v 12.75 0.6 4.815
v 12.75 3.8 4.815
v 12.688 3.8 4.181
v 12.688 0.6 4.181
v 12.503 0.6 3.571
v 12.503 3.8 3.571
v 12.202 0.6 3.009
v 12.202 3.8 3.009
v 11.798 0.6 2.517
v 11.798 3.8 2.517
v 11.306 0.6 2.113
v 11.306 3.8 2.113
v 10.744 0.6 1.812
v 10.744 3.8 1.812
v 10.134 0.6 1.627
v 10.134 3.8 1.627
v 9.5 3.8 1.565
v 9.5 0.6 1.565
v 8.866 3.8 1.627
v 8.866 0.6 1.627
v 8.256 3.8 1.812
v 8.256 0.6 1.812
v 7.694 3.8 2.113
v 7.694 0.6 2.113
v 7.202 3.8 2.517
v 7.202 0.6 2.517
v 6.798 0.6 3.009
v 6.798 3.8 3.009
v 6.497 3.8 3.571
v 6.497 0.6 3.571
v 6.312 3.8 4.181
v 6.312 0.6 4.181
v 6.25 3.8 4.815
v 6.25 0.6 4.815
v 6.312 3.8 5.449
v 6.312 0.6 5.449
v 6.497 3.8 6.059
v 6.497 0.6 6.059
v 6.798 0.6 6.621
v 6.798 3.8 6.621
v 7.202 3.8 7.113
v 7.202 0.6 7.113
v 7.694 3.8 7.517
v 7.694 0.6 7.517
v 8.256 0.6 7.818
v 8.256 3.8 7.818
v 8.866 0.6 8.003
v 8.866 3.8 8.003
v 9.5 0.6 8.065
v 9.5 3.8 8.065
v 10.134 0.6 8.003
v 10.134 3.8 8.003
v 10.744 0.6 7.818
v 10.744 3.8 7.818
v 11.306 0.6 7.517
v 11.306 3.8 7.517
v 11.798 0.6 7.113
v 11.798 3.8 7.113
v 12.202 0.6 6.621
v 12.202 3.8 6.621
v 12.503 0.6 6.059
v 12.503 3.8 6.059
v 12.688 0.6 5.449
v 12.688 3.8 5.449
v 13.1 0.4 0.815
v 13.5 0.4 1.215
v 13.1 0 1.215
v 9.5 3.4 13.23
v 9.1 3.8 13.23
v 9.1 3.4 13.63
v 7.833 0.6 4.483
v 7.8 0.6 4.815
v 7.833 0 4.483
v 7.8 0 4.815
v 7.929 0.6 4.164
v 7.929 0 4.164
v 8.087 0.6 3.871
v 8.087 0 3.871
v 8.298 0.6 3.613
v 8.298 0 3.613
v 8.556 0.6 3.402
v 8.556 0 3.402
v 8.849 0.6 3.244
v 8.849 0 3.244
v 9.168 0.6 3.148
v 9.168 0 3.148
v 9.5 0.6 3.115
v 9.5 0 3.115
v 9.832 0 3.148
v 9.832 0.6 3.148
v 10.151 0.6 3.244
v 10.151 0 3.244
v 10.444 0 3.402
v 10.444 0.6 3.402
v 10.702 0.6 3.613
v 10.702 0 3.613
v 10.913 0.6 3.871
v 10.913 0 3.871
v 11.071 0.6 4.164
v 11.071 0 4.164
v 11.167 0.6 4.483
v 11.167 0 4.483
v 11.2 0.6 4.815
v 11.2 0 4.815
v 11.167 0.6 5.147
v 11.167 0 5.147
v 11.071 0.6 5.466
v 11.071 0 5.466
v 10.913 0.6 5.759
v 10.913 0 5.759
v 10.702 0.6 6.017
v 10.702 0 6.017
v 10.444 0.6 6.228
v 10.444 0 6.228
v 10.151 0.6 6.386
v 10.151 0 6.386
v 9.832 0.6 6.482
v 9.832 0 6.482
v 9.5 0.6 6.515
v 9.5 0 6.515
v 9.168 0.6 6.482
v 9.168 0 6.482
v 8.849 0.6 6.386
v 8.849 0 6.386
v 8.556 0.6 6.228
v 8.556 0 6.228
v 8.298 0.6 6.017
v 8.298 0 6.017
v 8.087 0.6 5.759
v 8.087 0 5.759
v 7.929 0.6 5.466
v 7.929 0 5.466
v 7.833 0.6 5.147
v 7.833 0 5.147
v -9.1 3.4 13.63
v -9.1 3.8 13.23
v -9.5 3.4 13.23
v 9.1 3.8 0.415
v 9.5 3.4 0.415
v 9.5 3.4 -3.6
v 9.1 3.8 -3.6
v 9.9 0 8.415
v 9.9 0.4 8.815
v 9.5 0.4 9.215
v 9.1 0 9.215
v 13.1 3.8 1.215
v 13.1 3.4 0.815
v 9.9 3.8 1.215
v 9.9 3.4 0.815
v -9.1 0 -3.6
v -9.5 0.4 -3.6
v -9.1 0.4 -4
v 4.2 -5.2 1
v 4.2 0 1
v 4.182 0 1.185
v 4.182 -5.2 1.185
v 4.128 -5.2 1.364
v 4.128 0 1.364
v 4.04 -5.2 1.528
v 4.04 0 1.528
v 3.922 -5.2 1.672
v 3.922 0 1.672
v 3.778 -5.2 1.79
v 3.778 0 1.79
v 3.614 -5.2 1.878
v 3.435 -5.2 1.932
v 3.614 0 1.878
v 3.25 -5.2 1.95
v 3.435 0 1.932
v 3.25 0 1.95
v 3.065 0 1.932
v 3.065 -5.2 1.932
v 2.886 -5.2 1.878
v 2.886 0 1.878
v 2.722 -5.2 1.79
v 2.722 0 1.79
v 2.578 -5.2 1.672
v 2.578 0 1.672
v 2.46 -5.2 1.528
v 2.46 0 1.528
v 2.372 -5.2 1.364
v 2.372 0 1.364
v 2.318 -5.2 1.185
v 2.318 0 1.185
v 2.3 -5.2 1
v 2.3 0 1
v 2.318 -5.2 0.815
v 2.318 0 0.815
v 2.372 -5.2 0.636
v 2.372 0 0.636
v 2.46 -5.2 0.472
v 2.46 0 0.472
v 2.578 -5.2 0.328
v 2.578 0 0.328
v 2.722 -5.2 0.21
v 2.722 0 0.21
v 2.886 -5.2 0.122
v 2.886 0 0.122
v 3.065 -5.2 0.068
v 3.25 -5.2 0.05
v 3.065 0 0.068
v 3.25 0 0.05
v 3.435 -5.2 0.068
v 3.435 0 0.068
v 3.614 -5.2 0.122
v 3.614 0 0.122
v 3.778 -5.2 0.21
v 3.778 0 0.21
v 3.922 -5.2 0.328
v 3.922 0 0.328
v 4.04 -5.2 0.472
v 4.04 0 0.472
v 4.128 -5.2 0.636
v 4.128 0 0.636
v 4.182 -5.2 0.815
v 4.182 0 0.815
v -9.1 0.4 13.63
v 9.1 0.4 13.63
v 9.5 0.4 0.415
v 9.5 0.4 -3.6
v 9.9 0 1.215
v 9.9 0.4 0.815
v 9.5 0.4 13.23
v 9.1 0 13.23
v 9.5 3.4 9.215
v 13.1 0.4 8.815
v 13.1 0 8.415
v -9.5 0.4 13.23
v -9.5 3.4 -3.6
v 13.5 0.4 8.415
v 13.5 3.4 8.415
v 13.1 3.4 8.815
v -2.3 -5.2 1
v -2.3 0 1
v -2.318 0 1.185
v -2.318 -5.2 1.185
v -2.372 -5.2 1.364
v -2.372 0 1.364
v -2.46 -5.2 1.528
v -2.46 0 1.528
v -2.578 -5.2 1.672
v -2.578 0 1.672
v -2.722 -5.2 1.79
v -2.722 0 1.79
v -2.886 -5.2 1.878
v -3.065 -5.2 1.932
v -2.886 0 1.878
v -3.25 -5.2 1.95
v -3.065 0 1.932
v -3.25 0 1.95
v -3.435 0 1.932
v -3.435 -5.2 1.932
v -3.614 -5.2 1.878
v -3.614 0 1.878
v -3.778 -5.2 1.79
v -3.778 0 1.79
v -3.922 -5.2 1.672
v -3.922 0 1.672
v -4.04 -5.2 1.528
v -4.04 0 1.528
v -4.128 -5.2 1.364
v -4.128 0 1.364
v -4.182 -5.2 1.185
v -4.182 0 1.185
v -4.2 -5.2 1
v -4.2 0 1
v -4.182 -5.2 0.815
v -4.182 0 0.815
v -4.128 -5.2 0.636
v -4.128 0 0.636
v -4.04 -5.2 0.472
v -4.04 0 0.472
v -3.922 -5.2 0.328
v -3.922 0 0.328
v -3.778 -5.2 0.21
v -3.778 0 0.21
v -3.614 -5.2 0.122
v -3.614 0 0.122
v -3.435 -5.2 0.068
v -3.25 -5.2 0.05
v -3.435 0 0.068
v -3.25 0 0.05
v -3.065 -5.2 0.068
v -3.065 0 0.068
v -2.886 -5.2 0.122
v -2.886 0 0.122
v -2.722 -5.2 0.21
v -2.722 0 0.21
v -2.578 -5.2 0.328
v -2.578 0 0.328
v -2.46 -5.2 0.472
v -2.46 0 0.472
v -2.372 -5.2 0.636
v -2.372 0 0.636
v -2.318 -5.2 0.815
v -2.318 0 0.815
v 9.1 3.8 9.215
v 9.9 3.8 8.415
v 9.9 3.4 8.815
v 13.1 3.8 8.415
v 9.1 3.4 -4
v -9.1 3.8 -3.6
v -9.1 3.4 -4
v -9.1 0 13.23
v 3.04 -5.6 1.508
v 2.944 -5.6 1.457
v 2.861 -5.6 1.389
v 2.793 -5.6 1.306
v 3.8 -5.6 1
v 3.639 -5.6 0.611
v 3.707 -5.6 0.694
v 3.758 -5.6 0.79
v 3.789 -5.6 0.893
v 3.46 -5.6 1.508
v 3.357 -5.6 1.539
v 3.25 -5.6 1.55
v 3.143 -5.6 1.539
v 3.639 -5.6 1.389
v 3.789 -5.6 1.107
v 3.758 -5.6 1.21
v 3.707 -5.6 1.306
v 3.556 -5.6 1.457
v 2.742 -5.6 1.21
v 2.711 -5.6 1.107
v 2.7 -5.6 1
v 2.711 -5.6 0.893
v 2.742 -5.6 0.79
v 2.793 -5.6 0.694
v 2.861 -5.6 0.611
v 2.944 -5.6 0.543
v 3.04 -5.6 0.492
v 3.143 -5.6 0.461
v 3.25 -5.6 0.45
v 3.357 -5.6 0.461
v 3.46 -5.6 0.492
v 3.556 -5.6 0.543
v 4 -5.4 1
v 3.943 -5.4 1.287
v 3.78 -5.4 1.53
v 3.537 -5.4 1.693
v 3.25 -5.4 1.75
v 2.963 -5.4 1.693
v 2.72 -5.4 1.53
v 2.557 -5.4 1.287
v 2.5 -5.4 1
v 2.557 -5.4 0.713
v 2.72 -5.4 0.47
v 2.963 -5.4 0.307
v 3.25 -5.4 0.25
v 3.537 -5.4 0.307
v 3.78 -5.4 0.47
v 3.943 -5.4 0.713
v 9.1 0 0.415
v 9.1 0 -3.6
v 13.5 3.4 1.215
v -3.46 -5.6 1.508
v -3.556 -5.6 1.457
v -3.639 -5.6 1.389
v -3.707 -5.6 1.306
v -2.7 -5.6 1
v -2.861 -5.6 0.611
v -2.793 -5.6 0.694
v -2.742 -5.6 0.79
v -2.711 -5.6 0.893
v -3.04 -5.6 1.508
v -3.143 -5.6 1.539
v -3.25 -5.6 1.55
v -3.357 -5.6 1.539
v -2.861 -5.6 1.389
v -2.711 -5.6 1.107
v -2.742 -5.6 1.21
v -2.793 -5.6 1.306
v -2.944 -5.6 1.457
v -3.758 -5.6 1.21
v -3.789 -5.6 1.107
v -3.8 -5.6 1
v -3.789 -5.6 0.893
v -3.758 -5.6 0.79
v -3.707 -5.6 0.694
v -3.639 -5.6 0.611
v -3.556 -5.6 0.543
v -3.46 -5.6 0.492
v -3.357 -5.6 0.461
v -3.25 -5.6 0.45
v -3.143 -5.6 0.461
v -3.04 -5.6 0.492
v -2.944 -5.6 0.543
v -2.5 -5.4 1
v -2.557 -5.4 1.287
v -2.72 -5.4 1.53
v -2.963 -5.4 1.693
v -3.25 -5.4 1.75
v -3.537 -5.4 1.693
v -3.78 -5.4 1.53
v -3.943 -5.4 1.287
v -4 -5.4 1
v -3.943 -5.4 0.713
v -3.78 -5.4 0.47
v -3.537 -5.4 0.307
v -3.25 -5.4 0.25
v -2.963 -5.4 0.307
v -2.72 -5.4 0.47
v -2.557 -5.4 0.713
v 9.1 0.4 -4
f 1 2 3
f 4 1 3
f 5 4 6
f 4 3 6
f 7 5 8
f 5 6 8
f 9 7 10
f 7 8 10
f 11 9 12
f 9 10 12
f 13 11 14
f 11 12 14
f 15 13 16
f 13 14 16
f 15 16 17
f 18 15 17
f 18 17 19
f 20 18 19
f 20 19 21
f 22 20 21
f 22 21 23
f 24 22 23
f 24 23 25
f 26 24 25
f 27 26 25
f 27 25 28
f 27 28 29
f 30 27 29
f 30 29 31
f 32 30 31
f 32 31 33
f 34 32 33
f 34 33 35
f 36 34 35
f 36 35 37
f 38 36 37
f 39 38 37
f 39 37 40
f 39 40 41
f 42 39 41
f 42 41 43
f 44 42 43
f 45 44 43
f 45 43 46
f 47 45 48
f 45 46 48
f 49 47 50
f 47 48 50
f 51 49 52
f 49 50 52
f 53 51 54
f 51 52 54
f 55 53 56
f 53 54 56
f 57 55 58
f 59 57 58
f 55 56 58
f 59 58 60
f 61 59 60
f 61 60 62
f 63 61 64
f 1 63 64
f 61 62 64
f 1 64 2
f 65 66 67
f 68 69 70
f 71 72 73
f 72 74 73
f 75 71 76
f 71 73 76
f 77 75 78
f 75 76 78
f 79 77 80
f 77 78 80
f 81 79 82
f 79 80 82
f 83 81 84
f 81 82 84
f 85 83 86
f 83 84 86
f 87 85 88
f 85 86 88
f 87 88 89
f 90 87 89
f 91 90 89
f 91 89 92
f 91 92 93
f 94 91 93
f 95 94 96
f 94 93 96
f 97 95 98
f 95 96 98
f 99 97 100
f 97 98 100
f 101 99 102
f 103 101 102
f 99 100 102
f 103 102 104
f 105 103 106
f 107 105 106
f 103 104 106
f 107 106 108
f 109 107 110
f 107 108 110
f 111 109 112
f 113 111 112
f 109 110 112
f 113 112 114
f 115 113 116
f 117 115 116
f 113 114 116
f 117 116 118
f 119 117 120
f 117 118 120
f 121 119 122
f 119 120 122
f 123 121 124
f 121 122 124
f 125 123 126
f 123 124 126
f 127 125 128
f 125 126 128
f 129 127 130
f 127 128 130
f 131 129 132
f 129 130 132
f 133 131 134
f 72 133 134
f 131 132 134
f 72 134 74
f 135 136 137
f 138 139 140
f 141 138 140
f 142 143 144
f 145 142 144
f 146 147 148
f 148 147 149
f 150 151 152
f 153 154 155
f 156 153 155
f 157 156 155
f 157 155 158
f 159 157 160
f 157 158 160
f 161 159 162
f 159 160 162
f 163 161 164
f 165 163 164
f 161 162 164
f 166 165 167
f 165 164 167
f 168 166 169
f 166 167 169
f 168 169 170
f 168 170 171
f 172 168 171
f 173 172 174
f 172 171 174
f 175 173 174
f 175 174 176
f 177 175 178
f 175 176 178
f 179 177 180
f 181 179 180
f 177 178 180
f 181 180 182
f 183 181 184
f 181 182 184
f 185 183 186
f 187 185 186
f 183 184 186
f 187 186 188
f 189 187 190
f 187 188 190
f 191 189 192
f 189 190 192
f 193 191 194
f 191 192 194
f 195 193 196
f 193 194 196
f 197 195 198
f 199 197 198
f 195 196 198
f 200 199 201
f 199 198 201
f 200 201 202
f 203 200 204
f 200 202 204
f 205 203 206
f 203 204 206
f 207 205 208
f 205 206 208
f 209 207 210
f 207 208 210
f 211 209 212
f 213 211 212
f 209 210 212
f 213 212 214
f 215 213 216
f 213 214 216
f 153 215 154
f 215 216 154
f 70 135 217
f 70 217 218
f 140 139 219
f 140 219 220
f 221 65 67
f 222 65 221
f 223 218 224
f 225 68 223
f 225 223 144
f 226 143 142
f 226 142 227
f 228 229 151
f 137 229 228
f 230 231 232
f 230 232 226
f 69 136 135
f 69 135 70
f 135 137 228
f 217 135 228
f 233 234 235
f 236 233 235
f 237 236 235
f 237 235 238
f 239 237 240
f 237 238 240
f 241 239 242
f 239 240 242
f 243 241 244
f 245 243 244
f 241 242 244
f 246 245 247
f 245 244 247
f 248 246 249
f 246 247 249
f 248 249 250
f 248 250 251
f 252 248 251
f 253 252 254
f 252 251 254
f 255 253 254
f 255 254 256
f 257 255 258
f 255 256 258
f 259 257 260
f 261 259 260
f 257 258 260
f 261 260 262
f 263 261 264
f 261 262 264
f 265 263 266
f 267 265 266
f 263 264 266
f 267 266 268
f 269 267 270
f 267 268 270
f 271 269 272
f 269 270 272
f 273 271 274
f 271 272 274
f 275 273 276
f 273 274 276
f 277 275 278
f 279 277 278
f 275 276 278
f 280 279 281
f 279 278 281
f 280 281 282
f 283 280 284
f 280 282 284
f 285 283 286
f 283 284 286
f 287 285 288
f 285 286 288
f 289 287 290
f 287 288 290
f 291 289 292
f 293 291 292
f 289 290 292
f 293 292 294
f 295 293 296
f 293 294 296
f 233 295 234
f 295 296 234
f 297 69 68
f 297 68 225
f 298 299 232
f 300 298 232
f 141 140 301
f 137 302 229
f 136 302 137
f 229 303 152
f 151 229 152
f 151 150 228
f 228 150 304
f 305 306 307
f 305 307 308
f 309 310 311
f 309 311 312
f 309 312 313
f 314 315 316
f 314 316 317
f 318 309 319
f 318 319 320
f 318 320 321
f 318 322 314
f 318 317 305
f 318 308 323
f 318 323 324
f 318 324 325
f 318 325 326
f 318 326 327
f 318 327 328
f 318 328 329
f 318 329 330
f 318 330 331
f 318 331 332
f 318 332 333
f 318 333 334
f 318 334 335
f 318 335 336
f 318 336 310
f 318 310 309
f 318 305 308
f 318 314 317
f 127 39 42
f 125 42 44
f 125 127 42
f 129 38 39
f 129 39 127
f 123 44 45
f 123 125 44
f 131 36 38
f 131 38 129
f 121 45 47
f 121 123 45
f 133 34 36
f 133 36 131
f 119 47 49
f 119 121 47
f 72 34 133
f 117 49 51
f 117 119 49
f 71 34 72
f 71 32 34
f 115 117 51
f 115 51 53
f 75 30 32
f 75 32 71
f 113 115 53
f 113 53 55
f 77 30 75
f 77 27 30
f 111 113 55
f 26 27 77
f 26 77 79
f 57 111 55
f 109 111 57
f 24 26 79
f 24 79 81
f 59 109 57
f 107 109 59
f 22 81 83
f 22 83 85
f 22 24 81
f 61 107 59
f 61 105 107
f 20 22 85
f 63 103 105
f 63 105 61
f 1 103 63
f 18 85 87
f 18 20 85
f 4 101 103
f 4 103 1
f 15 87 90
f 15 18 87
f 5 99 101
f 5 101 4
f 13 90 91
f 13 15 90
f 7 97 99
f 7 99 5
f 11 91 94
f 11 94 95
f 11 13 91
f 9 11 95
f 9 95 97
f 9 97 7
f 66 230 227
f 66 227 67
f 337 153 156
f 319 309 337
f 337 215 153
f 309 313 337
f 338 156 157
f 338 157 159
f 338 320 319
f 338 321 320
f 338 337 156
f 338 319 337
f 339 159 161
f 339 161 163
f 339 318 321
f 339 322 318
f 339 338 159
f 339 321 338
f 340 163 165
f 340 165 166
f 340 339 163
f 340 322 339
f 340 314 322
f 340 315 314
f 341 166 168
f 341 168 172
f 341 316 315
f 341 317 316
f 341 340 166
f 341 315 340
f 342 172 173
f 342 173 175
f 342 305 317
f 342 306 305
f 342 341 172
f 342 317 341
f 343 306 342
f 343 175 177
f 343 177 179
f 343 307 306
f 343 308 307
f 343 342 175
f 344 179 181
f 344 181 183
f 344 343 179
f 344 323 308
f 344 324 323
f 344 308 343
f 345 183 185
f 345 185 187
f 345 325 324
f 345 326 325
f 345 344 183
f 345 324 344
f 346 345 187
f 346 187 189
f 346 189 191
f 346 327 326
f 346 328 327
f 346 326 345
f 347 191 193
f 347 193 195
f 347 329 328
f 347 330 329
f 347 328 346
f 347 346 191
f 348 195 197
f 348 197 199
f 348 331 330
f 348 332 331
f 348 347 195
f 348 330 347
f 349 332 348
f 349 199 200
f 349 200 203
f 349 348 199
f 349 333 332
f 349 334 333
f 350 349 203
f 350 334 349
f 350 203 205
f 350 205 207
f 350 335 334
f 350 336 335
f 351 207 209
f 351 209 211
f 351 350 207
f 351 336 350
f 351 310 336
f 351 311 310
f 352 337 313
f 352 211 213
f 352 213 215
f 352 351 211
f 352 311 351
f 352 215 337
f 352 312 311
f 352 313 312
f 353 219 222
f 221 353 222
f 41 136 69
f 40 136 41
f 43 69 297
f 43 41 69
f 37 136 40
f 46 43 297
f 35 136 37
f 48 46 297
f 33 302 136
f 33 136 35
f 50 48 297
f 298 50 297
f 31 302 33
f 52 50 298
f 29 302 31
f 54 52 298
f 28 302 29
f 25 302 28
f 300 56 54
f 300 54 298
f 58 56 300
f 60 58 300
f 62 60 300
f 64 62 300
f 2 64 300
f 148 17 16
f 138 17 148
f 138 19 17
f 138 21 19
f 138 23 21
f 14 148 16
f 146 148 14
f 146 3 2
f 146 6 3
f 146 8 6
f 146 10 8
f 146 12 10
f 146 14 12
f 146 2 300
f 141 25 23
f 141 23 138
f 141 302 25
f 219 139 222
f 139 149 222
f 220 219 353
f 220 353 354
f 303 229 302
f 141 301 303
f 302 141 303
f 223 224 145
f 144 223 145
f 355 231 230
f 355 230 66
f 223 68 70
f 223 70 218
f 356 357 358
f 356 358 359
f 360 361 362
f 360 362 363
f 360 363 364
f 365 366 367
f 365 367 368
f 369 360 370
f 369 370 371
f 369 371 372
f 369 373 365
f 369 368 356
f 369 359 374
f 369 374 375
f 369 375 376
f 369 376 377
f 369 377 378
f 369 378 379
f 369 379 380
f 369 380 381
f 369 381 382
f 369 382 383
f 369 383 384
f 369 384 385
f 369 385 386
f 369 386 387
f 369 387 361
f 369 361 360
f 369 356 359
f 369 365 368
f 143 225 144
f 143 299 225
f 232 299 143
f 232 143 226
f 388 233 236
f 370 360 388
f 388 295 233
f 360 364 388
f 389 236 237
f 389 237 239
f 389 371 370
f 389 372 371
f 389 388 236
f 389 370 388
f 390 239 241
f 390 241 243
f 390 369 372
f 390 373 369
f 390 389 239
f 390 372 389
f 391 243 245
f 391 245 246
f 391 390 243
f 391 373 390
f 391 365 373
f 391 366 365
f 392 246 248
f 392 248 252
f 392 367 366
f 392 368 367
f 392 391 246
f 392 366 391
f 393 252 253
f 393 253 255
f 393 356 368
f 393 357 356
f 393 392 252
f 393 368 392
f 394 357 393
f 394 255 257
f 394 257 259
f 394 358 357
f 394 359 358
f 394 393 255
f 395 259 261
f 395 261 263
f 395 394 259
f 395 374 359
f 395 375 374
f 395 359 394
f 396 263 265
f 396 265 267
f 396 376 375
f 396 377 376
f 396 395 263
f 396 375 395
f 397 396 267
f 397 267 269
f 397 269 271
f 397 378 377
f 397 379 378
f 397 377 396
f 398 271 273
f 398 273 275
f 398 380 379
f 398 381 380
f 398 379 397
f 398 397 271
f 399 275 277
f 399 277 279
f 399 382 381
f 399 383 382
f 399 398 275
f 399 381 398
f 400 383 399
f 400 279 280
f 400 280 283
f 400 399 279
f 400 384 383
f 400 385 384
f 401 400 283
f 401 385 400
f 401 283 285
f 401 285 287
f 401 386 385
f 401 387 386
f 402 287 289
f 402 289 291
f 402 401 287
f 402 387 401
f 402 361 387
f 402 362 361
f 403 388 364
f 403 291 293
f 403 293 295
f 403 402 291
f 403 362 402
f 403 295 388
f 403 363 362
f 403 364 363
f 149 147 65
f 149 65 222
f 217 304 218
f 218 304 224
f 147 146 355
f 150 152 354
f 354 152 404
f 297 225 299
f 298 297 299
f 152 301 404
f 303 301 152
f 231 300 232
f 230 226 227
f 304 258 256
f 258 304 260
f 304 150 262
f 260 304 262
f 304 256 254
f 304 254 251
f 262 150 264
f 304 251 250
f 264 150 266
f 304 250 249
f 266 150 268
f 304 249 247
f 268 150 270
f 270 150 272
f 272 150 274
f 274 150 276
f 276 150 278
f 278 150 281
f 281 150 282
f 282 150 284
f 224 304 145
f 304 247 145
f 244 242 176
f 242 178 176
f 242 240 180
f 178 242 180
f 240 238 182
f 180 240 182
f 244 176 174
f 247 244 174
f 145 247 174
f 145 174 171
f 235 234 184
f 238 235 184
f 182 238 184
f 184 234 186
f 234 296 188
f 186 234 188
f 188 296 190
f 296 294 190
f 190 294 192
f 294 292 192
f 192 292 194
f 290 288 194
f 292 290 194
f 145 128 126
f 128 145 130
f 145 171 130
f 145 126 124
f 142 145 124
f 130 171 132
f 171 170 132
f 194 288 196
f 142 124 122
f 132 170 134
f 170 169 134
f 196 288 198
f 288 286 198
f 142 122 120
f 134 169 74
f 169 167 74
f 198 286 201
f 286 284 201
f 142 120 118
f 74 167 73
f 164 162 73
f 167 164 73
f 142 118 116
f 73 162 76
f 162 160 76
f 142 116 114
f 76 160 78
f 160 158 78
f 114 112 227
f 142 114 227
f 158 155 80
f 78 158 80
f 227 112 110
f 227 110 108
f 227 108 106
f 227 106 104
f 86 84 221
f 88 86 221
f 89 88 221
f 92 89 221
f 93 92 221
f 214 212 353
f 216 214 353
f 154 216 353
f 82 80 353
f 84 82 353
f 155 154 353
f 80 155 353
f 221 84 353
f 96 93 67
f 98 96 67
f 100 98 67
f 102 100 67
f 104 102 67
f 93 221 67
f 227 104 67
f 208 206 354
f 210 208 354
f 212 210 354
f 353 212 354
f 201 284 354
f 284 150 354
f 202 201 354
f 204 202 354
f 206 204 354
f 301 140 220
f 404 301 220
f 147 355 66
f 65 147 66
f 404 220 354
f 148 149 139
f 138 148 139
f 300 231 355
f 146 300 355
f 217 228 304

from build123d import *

# Parameters (mm, degrees)
SKETCH1_W                      = 13
SKETCH1_H                      = 8
BOSS_EXTRUDE1_DEPTH            = 3.8
SKETCH2_R                      = 0.95
BOSS_EXTRUDE2_DEPTH            = 5.6
BOSS_EXTRUDE5_DEPTH            = 3.8
CBORE_FOR_M3_SHCS1_D           = 3.4
CBORE_FOR_M3_SHCS1_CBORE_D     = 6.5
CBORE_FOR_M3_SHCS1_CBORE_DEPTH = 3.2
CHAMFER4_SIZE                  = 0.4


with BuildPart() as part:
    # Sketch1 → Boss-Extrude1 (new body)
    with BuildSketch(Plane(origin=(0, 0, 0), x_dir=(1, 0, 0), z_dir=(0, 1, 0))):
        Rectangle(SKETCH1_W, SKETCH1_H)
    extrude(amount=BOSS_EXTRUDE1_DEPTH)

    # Sketch2 → Boss-Extrude2 (add)
    with BuildSketch(Plane.XZ):
        with Locations((3.25, 1)):
            Circle(SKETCH2_R)
        with Locations((-3.25, 1)):
            Circle(SKETCH2_R)
    extrude(amount=BOSS_EXTRUDE2_DEPTH)

    # Sketch8 → Boss-Extrude5 (add)
    with BuildSketch(Plane(origin=(0, 3.8, 0), x_dir=(1, 0, 0), z_dir=(0, 1, 0))):
        Polygon((-9.5, -13.63), (9.5, -13.63), (9.5, -8.815), (13.5, -8.815), (13.5, -0.815), (9.5, -0.815), (9.5, 4), (-9.5, 4), align=None)
    extrude(amount=-BOSS_EXTRUDE5_DEPTH)

    # CBORE for M3 SHCS1 (through all)
    with Locations(Plane(origin=(0, 3.8, 0), x_dir=(1, 0, 0), z_dir=(0, 1, 0))):
        with Locations((9.5, -4.815)):
            CounterBoreHole(CBORE_FOR_M3_SHCS1_D / 2, CBORE_FOR_M3_SHCS1_CBORE_D / 2, CBORE_FOR_M3_SHCS1_CBORE_DEPTH)

    # Chamfer4
    chamfer4_edges = [part.edges().sort_by_distance(p)[0] for p in [
        (2.3, -5.6, 1),
        (-4.2, -5.6, 1),
        (-9.5, 3.8, 4.815),
        (0, 3.8, 13.63),
        (9.5, 3.8, 11.2225),
        (11.5, 3.8, 8.815),
        (13.5, 3.8, 4.815),
        (11.5, 3.8, 0.815),
        (9.5, 3.8, -1.5925),
        (-9.5, 1.9, -4),
        (-9.5, 0, 4.815),
        (-9.5, 1.9, 13.63),
        (0, 0, 13.63),
        (9.5, 1.9, 13.63),
        (9.5, 0, 11.2225),
        (9.5, 1.9, 8.815),
        (11.5, 0, 8.815),
        (13.5, 1.9, 8.815),
        (13.5, 0, 4.815),
        (13.5, 1.9, 0.815),
        (11.5, 0, 0.815),
        (9.5, 1.9, 0.815),
        (9.5, 0, -1.5925),
        (9.5, 1.9, -4),
        (0, 0, -4),
        (0, 3.8, -4),
    ]]
    chamfer(chamfer4_edges, length=CHAMFER4_SIZE)


solid = part.part
